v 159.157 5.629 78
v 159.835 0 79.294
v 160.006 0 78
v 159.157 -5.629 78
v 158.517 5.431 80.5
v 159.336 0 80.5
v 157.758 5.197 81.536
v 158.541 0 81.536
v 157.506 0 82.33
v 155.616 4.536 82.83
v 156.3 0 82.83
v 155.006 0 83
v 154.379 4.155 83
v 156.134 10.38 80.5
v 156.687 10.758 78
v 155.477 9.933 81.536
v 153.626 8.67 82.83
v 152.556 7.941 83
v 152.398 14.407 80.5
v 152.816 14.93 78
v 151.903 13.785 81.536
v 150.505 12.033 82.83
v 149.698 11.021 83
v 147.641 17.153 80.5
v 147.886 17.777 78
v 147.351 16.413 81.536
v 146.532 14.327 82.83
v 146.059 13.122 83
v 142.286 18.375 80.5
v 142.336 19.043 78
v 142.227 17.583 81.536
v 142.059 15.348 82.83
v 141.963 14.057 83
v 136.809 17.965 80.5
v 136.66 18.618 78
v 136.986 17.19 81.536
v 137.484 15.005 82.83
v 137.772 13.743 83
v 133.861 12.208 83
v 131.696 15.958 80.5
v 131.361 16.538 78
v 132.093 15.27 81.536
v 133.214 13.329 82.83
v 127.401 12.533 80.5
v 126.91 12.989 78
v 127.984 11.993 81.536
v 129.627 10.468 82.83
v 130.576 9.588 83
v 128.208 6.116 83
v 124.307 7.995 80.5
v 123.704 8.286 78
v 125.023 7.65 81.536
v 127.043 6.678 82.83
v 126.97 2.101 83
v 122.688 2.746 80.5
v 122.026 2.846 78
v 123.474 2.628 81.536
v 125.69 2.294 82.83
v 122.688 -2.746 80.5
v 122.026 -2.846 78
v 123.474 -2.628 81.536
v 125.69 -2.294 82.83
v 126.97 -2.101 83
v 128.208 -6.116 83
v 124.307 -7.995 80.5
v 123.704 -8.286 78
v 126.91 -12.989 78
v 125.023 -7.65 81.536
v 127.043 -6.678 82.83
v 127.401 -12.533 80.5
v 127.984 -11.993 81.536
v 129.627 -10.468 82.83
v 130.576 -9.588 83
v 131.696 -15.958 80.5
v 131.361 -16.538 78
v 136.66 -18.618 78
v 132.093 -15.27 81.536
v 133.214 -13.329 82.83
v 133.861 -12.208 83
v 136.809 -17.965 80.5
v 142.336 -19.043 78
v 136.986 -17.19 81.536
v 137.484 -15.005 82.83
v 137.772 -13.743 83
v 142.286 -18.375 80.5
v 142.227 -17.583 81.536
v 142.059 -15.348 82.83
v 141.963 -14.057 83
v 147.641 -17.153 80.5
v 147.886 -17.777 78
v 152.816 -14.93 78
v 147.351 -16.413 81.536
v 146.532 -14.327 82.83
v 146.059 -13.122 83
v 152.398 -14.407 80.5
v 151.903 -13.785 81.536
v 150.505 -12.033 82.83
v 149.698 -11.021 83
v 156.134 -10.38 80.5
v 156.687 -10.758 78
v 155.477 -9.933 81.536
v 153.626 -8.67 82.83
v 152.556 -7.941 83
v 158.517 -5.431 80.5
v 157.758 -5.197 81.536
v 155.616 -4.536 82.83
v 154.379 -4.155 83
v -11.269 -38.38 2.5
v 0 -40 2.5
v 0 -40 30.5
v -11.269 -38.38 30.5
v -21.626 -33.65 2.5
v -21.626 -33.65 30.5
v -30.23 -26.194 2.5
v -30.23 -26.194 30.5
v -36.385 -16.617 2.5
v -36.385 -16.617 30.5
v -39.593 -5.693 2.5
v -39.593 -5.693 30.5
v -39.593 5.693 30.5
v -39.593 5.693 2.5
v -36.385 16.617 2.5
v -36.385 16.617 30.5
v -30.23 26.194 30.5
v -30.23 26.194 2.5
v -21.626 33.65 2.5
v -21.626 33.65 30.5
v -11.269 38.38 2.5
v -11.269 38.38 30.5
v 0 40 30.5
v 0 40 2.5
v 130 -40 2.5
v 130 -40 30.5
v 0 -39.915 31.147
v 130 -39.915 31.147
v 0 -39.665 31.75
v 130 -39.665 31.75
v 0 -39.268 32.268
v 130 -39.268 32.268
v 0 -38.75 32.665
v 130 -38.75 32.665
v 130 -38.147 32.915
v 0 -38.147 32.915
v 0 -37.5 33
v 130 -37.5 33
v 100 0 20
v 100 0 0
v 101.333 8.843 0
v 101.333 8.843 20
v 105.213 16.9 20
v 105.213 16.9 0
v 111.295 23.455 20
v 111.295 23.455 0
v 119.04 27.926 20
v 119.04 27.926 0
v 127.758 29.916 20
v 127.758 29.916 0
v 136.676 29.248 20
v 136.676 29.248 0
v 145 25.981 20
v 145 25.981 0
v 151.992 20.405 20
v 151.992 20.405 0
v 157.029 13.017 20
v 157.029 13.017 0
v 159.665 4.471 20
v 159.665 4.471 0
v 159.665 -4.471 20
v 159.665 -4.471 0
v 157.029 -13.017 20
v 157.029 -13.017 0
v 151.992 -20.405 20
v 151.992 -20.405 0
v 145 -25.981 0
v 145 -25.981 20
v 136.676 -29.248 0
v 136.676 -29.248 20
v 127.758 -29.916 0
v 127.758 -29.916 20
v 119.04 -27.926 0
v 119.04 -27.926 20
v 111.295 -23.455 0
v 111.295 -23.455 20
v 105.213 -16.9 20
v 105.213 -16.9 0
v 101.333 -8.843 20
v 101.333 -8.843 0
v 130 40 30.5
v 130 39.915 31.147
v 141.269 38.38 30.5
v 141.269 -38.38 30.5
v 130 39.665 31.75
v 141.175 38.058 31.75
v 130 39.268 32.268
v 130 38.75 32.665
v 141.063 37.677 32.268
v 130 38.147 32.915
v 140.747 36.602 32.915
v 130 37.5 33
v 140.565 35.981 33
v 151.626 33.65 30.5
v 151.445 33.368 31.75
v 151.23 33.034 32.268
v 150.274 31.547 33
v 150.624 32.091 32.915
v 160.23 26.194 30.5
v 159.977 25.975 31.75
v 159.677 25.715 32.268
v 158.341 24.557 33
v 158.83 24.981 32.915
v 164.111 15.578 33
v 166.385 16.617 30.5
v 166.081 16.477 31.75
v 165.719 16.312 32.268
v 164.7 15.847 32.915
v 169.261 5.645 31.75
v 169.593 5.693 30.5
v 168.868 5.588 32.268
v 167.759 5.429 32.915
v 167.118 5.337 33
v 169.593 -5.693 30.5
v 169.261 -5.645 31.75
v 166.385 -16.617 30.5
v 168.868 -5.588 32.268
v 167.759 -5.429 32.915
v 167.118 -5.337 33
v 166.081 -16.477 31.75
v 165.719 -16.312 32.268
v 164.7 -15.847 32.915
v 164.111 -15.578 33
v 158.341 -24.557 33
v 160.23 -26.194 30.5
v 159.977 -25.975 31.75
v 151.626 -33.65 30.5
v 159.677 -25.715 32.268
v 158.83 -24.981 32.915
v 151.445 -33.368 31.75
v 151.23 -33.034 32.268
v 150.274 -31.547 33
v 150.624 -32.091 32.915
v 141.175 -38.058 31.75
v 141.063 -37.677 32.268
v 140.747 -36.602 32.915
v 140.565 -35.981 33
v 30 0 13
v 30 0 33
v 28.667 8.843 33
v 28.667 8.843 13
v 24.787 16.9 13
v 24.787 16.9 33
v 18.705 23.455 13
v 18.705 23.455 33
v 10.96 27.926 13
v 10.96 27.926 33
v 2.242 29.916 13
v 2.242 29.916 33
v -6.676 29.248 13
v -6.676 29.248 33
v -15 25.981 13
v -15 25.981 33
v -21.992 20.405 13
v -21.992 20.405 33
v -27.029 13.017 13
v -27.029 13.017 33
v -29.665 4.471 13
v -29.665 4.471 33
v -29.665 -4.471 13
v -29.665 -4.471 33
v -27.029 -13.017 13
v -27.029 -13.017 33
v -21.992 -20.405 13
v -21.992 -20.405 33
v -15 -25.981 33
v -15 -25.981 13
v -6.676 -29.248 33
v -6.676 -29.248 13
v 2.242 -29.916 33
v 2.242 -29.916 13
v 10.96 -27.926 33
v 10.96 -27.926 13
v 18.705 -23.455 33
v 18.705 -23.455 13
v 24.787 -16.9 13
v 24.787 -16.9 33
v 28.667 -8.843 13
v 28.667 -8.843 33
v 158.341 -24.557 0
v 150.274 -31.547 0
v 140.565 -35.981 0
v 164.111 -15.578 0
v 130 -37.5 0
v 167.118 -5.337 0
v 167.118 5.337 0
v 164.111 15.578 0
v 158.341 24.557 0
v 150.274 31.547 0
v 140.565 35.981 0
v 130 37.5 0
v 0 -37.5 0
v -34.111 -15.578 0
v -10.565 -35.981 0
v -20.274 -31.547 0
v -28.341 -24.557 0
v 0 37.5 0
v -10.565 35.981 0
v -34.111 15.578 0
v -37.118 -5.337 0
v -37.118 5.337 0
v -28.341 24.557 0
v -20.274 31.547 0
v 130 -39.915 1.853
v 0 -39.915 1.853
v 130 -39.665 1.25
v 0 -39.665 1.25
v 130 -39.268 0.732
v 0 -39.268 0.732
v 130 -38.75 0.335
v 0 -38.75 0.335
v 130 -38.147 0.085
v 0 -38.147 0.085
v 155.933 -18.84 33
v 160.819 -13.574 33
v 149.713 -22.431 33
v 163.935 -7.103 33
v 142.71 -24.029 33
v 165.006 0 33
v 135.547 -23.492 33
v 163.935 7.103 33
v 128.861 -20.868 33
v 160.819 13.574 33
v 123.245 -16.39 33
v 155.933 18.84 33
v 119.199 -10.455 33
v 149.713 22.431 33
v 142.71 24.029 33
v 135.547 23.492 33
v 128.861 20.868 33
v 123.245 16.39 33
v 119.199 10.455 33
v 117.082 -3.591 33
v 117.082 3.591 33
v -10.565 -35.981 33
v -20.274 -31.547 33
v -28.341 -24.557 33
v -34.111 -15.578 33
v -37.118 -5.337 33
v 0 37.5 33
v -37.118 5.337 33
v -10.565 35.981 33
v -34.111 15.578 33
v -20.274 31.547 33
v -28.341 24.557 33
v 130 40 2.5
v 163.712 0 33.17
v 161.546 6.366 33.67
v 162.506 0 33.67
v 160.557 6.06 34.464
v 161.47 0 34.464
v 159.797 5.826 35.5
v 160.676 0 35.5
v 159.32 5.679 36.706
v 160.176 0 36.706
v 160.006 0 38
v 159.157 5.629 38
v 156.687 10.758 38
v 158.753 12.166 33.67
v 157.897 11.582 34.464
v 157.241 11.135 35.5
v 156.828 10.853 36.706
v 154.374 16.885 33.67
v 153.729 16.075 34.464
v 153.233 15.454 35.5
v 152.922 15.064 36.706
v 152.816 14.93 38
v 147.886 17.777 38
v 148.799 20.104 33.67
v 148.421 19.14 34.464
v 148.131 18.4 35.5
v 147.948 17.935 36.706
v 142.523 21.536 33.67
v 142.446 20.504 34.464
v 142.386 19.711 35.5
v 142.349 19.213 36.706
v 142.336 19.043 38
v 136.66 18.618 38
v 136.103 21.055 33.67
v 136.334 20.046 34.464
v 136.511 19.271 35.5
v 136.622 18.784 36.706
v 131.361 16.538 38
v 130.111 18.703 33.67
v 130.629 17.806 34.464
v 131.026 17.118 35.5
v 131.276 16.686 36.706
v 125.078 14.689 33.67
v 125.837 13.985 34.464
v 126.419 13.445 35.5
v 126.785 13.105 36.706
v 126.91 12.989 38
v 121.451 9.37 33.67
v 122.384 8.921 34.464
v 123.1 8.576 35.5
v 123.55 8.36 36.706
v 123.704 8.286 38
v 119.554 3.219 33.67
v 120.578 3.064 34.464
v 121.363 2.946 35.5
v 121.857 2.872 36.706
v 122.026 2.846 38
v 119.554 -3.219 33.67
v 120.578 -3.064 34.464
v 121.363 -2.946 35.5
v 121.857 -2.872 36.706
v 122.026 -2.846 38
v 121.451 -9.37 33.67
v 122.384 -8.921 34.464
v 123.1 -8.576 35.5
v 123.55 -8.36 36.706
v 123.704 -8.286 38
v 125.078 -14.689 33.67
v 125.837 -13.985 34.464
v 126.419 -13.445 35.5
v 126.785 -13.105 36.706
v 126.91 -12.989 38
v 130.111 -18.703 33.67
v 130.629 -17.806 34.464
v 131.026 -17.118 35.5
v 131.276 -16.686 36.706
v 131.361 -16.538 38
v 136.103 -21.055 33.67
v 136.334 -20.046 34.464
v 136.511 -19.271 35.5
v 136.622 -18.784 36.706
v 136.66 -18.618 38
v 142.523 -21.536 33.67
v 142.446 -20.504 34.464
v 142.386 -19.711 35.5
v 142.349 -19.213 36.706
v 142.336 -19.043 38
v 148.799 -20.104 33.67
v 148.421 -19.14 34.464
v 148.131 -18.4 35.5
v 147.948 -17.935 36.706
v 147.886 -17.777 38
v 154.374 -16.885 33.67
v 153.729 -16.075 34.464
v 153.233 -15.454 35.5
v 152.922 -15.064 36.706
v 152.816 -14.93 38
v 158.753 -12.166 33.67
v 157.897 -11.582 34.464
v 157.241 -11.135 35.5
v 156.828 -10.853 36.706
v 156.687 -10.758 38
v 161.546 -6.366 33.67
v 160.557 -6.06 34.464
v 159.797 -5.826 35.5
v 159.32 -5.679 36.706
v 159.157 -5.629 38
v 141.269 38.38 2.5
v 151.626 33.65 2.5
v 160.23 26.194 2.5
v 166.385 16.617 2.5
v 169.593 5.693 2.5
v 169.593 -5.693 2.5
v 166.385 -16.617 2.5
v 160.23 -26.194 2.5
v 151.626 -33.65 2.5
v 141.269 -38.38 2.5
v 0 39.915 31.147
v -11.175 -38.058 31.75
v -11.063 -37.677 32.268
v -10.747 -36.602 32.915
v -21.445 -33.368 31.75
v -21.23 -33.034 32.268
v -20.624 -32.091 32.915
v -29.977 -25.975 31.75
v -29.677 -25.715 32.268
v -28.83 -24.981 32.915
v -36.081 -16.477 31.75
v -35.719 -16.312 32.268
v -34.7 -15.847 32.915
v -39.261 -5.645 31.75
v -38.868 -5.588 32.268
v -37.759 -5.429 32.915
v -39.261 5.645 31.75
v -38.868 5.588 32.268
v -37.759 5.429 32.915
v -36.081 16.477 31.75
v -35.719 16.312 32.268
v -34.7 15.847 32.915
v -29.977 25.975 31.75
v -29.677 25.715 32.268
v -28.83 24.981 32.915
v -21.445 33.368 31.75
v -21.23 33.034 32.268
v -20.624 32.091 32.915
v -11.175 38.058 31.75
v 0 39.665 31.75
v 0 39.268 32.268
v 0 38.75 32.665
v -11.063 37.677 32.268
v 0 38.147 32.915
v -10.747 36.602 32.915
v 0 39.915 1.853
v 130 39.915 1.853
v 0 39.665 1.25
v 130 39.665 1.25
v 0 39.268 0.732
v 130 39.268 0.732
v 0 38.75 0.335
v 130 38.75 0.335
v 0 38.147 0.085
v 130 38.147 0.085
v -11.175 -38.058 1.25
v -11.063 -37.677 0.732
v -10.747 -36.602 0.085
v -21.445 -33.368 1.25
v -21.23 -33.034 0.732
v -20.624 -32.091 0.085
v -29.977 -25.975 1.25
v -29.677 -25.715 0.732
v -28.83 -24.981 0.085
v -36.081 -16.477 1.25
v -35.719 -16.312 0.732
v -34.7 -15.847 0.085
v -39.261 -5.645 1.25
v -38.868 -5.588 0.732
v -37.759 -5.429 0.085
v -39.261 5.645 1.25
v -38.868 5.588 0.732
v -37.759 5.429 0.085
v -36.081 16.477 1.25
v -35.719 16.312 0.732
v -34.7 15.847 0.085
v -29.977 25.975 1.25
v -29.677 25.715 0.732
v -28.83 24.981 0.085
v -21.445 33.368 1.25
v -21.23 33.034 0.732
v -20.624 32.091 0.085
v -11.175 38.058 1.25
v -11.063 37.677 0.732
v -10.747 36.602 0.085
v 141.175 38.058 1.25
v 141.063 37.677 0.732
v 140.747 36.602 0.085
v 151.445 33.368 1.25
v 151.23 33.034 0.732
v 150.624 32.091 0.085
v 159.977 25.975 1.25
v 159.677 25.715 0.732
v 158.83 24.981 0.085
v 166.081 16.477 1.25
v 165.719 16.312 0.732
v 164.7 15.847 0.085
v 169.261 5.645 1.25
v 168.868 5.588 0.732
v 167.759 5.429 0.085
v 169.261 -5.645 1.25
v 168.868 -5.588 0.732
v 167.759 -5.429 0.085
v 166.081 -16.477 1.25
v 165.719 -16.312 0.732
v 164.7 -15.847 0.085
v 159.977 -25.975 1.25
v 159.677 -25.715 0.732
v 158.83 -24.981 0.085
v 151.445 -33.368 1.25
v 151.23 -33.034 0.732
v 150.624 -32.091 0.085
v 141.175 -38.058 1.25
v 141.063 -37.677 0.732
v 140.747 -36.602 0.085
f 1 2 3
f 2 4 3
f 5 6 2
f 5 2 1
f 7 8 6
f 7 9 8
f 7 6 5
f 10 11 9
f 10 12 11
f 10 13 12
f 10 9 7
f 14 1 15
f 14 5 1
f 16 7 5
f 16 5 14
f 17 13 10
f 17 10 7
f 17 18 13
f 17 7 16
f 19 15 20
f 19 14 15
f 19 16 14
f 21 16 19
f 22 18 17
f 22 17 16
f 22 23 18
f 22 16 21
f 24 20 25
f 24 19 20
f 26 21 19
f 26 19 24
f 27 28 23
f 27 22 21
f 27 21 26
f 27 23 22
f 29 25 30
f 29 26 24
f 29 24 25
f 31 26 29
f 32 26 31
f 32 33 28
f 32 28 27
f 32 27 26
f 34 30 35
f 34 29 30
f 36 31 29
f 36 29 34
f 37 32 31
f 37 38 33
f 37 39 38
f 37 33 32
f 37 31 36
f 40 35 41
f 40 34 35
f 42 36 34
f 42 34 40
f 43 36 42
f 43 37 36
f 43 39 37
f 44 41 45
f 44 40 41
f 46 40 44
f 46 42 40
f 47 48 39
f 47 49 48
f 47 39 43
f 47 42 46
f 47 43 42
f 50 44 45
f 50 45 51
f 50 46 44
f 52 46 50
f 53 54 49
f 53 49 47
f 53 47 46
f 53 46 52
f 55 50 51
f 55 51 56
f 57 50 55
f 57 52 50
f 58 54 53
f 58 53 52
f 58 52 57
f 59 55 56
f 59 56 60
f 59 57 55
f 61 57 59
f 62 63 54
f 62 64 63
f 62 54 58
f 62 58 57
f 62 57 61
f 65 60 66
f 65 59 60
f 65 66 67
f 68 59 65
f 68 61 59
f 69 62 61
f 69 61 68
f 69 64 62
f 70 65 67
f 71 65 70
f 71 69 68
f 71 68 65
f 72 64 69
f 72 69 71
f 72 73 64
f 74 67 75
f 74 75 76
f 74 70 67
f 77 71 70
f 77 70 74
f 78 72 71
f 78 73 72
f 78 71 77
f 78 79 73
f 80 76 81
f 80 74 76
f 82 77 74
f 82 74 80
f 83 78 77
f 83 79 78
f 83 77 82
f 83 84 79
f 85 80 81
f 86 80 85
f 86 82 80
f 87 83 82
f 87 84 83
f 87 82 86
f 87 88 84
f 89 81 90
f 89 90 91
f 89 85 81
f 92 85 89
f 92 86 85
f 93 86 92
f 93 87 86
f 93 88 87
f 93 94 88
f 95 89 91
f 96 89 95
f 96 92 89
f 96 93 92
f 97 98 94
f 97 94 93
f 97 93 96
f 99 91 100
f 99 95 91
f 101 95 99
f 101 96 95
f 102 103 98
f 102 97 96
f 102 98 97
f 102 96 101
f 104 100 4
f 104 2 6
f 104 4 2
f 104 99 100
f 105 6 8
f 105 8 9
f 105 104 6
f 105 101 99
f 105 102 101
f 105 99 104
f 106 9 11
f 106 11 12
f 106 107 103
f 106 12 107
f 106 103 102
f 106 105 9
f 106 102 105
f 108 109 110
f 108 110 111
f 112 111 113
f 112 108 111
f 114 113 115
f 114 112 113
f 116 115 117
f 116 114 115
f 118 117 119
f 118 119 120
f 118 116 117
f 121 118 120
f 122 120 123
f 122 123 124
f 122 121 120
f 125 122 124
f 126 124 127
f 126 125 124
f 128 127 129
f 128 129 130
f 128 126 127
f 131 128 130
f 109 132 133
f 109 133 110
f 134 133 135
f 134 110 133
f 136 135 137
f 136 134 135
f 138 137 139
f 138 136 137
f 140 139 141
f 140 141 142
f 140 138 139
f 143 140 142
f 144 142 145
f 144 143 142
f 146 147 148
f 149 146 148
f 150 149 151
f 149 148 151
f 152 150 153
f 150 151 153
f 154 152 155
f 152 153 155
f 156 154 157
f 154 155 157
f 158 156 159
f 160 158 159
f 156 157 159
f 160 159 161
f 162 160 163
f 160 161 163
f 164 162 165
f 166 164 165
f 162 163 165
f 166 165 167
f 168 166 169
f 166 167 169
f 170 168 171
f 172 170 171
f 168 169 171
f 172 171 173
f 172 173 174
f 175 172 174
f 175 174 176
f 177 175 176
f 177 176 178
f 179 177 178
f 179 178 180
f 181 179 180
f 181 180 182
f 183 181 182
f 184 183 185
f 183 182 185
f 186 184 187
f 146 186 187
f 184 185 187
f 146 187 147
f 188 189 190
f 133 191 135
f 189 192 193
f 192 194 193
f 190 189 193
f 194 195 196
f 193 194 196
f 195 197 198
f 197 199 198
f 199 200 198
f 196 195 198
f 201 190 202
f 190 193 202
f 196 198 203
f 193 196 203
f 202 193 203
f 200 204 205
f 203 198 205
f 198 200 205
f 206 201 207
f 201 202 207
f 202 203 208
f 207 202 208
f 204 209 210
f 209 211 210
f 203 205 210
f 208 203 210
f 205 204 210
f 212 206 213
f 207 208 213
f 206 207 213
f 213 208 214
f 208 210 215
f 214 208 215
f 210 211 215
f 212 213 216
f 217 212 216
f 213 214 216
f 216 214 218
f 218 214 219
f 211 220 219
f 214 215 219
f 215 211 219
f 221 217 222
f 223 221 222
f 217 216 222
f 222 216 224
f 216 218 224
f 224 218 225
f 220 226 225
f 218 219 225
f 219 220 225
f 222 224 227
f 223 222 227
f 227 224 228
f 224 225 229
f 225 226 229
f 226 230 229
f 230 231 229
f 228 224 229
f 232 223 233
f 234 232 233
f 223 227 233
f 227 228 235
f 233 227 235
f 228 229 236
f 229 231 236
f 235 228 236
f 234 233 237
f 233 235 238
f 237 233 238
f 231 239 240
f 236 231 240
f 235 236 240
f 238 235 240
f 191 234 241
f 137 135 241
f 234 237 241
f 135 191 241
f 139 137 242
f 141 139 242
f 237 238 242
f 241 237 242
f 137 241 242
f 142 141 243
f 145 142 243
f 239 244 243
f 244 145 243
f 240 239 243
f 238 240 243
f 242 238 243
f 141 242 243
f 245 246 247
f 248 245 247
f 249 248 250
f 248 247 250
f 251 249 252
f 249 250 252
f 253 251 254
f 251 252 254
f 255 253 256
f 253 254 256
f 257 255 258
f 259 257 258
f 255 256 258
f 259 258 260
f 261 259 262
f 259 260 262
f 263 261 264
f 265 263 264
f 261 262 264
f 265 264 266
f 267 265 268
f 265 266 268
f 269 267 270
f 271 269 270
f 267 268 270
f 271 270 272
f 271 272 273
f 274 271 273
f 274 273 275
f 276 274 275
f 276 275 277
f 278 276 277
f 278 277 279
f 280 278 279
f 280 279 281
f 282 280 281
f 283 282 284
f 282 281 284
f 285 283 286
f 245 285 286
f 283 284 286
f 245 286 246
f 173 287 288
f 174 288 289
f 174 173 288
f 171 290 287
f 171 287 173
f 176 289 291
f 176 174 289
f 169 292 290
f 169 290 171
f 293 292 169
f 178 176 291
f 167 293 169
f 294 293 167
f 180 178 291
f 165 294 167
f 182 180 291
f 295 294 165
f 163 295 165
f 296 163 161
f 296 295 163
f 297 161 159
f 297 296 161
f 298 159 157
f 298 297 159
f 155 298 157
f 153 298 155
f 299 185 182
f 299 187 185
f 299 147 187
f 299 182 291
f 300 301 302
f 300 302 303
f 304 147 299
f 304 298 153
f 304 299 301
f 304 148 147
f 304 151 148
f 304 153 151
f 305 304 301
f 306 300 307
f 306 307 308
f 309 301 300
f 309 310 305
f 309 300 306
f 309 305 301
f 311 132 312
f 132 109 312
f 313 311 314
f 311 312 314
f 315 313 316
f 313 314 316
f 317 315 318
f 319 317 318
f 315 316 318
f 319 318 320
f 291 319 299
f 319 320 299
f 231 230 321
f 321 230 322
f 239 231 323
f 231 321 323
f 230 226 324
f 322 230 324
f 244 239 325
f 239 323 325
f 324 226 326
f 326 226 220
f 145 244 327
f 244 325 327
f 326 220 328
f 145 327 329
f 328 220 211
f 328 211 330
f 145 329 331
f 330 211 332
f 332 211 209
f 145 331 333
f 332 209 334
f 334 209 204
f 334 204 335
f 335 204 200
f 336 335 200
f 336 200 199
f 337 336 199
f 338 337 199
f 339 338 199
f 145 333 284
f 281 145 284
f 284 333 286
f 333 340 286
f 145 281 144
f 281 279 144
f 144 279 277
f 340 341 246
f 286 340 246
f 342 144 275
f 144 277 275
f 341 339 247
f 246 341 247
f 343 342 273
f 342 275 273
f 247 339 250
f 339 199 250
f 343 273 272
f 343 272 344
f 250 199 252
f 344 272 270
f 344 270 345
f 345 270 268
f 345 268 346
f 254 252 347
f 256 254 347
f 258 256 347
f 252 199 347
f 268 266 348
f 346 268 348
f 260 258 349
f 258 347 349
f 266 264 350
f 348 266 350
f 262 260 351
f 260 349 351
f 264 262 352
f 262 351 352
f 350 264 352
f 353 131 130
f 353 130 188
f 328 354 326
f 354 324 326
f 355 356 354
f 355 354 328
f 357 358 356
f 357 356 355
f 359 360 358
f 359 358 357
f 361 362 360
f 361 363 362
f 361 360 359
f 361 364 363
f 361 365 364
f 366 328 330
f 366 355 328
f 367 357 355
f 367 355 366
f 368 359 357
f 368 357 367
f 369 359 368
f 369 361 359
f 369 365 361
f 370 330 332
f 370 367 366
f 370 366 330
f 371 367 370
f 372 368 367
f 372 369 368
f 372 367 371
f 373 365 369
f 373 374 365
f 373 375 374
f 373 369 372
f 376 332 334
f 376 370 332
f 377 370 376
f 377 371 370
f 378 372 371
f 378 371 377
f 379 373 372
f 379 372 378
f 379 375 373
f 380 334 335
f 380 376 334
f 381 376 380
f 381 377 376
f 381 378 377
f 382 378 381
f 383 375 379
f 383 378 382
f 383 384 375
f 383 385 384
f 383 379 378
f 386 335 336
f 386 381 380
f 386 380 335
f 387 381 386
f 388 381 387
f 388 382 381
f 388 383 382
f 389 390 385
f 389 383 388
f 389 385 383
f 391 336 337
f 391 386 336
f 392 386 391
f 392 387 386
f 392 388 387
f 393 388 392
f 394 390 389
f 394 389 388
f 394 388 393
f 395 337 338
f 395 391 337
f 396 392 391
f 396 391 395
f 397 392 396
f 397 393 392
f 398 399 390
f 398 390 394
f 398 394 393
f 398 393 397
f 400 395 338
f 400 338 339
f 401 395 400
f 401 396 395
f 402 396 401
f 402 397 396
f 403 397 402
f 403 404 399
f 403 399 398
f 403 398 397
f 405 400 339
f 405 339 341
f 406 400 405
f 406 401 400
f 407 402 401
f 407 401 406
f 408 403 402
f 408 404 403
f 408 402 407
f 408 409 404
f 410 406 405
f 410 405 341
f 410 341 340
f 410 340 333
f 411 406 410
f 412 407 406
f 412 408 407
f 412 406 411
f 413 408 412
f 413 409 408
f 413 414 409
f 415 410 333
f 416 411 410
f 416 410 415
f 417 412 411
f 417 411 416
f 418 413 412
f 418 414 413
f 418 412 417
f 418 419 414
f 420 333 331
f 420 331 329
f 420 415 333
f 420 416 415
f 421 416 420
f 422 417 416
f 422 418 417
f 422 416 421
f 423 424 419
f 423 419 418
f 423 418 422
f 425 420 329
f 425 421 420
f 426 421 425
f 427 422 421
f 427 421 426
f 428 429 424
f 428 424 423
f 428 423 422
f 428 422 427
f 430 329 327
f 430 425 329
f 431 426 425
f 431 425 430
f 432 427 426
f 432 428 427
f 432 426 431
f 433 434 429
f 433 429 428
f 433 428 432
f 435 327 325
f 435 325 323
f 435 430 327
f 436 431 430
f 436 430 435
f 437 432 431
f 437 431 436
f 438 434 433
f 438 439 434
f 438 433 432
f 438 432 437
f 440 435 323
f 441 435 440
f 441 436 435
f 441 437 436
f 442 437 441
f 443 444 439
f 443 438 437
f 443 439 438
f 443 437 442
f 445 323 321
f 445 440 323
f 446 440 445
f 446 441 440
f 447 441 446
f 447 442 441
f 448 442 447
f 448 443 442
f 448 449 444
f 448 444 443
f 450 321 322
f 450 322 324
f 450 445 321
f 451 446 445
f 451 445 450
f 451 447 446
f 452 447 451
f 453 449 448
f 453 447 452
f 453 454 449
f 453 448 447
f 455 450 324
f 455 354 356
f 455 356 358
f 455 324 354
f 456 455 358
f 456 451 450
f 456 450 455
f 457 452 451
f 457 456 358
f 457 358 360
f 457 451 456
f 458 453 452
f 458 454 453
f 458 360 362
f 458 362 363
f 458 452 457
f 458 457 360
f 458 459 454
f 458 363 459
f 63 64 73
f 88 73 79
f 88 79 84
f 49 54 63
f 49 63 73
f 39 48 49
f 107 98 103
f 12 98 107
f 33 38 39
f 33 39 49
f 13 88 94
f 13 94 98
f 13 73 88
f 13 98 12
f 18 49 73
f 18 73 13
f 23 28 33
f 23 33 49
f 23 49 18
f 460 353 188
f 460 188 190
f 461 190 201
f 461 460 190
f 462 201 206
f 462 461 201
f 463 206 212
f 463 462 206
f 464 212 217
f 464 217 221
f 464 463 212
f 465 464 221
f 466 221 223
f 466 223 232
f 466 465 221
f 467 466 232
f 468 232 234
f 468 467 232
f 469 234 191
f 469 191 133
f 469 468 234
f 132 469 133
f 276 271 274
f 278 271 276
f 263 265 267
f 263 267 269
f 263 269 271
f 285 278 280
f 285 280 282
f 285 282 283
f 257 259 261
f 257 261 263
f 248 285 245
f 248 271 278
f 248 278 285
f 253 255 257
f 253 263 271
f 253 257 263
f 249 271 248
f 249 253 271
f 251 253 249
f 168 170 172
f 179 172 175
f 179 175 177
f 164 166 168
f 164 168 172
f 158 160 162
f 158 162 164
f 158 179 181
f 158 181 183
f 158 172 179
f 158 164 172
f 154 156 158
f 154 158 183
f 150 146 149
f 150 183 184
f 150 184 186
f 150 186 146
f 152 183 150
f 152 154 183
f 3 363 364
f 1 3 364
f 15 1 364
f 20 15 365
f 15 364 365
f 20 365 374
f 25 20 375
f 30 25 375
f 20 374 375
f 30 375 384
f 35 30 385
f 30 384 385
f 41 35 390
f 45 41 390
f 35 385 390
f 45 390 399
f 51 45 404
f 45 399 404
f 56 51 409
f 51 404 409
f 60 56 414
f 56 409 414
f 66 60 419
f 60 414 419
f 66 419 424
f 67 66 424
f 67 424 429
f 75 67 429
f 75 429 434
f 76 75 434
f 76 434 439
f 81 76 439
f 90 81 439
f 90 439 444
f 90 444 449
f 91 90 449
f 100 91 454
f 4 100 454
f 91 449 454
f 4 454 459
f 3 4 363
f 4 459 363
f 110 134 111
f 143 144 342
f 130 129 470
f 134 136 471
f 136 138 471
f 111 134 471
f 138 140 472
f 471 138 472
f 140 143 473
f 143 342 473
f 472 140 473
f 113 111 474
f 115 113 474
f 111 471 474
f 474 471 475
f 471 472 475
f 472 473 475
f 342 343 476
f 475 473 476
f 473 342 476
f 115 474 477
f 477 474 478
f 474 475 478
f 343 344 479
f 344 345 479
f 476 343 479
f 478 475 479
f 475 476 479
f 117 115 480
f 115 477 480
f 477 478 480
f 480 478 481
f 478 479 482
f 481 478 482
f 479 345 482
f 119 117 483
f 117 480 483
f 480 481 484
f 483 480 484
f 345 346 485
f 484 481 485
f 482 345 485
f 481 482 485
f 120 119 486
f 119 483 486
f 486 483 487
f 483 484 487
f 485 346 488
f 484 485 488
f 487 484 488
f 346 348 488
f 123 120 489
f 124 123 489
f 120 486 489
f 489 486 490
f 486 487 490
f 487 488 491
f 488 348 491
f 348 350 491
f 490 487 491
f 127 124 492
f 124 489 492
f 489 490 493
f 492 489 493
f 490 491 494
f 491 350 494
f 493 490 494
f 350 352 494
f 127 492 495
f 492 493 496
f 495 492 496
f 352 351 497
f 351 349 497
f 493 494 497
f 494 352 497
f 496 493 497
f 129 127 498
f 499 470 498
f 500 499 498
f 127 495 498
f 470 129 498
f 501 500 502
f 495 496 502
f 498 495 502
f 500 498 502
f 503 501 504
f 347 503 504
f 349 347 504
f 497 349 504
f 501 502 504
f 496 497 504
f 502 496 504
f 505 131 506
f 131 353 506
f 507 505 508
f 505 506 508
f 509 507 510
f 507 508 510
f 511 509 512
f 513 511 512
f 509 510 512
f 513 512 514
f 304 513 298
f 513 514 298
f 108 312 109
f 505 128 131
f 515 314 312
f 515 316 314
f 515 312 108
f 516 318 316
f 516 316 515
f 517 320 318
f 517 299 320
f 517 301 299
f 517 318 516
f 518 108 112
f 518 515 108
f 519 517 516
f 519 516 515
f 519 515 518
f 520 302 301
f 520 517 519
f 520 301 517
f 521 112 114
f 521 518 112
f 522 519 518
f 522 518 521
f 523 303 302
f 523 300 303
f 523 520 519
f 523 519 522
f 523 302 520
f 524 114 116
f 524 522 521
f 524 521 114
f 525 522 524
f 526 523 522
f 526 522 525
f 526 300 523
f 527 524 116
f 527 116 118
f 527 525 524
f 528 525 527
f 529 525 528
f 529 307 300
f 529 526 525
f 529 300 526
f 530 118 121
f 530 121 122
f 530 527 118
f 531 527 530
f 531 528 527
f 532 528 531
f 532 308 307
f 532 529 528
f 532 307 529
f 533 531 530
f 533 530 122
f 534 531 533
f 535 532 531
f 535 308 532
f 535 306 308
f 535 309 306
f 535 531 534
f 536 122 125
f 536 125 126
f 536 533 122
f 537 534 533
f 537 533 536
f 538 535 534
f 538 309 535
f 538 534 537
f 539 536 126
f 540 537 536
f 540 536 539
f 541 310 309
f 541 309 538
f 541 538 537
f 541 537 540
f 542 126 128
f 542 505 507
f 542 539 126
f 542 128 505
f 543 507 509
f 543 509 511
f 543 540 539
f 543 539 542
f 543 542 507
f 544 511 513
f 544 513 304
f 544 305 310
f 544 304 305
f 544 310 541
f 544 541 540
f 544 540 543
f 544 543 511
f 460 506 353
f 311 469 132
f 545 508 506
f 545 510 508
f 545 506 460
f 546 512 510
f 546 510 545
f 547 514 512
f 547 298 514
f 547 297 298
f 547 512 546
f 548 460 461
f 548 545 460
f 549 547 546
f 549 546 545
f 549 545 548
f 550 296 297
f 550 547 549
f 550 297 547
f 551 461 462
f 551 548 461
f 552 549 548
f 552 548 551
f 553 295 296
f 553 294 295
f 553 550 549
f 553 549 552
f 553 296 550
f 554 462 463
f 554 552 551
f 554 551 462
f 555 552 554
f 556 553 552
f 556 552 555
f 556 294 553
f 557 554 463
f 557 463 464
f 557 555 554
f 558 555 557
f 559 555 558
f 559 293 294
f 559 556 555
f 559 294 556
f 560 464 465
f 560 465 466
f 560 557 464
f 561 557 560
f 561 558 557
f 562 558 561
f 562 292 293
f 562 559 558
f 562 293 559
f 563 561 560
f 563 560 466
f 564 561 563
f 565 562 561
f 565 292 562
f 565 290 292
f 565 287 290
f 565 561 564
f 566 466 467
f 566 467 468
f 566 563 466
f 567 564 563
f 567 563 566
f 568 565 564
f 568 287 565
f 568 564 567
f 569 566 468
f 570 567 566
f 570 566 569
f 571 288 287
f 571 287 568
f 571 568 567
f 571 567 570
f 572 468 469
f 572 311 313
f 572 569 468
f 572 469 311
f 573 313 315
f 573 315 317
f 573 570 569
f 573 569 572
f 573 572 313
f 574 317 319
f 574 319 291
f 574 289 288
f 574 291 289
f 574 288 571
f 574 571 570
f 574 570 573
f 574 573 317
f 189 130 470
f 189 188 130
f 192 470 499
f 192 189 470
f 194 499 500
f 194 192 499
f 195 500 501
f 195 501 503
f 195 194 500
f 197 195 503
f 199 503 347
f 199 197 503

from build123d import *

# Parameters (mm, degrees)
SALIENTE_EXTRUIR1_DEPTH = 33
REDONDEO1_R             = 2.5
CROQUIS2_R              = 30
CORTAR_EXTRUIR1_DEPTH   = 20
CROQUIS3_R              = 30
CORTAR_EXTRUIR2_DEPTH   = 20
CROQUIS4_R              = 19.096631059
SALIENTE_EXTRUIR2_DEPTH = 50
REDONDEO2_R             = 5


with BuildPart() as part:
    # Croquis1 → Saliente-Extruir1 (new body)
    with BuildSketch(Plane.XY):
        with BuildLine():
            Line((0, 40), (130, 40))
            ThreePointArc((130, 40), (170, 0), (130, -40))
            Line((130, -40), (0, -40))
            ThreePointArc((0, -40), (-40, 0), (0, 40))
        make_face()
    extrude(amount=SALIENTE_EXTRUIR1_DEPTH)

    # Redondeo1
    redondeo1_edges = [part.edges().sort_by_distance(p)[0] for p in [
        (170, 0, 33),
        (65, 40, 33),
        (-40, 0, 33),
        (65, 40, 0),
        (170, 0, 0),
        (65, -40, 0),
        (-40, 0, 0),
        (65, -40, 33),
    ]]
    fillet(redondeo1_edges, radius=REDONDEO1_R)

    # Croquis2 → Cortar-Extruir1 (cut)
    with BuildSketch(Plane.XY.offset(33)):
        Circle(CROQUIS2_R)
    extrude(amount=-CORTAR_EXTRUIR1_DEPTH, mode=Mode.SUBTRACT)

    # Croquis3 → Cortar-Extruir2 (cut)
    with BuildSketch(Plane(origin=(0, 0, 0), x_dir=(-1, 0, 0), z_dir=(0, 0, -1))):
        with Locations((-130, 0)):
            Circle(CROQUIS3_R)
    extrude(amount=-CORTAR_EXTRUIR2_DEPTH, mode=Mode.SUBTRACT)

    # Croquis4 → Saliente-Extruir2 (add)
    with BuildSketch(Plane.XY.offset(33)):
        with Locations((140.909108461, 0)):
            Circle(CROQUIS4_R)
    extrude(amount=SALIENTE_EXTRUIR2_DEPTH)

    # Redondeo2
    redondeo2_edges = [part.edges().sort_by_distance(p)[0] for p in [
        (121.812477402, 0, 33),
        (121.812477402, 0, 83),
    ]]
    fillet(redondeo2_edges, radius=REDONDEO2_R)


solid = part.part
